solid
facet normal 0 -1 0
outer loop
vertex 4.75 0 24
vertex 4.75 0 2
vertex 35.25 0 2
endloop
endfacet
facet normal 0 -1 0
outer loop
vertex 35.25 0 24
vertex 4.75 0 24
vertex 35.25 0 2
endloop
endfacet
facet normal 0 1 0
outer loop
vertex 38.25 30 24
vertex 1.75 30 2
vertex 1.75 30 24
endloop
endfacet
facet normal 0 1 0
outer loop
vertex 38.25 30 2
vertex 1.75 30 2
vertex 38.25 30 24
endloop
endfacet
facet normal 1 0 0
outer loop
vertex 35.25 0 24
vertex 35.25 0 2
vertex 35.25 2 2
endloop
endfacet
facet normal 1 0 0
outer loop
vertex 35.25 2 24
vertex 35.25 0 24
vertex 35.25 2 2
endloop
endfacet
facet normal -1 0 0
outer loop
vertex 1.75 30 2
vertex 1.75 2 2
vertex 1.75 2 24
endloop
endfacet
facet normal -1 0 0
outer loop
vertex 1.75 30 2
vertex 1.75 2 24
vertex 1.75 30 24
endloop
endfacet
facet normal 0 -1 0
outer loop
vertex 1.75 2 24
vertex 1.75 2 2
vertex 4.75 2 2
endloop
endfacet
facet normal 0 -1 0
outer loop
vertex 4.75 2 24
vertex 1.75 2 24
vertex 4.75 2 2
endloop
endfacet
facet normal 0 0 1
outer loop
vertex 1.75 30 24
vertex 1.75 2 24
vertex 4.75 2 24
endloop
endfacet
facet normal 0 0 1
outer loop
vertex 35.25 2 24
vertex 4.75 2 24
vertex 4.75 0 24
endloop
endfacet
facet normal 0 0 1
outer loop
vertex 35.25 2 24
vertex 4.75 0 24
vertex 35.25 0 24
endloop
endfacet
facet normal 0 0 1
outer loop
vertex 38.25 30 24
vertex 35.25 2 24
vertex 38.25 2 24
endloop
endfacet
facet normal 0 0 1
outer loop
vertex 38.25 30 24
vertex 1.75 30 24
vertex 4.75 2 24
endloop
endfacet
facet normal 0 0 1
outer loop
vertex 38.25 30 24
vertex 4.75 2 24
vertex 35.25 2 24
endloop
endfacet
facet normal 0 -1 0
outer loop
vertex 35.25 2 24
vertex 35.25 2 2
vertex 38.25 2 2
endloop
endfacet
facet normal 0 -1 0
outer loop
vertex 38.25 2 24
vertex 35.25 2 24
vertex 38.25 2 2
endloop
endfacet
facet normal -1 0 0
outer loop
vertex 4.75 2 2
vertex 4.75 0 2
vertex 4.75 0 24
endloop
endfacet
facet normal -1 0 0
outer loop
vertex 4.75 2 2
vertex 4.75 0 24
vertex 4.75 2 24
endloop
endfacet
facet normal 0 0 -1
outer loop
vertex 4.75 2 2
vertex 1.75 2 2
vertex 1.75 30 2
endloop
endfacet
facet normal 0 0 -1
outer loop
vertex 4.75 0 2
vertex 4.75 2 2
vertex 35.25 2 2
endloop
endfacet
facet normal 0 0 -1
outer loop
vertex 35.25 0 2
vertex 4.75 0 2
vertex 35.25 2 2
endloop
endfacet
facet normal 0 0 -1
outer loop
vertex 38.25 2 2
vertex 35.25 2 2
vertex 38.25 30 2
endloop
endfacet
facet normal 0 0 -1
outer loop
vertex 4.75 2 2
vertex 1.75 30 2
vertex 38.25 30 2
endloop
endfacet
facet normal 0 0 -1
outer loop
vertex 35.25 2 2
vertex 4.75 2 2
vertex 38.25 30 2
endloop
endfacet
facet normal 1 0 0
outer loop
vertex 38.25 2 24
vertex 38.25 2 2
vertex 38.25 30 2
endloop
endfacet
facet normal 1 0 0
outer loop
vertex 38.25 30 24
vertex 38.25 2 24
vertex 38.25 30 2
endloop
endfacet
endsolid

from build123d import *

# Parameters (mm, degrees)
BOX001_W     = 30.5
BOX001_H     = 30
BOX001_DEPTH = 22
BOX002_W     = 36.5
BOX002_H     = 28
BOX002_DEPTH = 22


with BuildPart() as cube001:
    # Box001 → Box001 (new body)
    with BuildSketch(Plane.XY):
        with Locations((15.25, 15)):
            Rectangle(BOX001_W, BOX001_H)
    extrude(amount=BOX001_DEPTH)


with BuildPart() as switch_slot:
    # Box002 → Box002 (new body)
    with BuildSketch(Plane(origin=(-3, 2, 0), x_dir=(1, 0, 0), z_dir=(0, 0, 1))):
        with Locations((18.25, 14)):
            Rectangle(BOX002_W, BOX002_H)
    extrude(amount=BOX002_DEPTH)

    # Fusion001: union Cube001
    add(cube001.part)


with BuildPart() as switch_slot_1:
    # Fusion001 placement: moved
    add(switch_slot.part.moved(Location((4.75, 0, 2))))


solid = switch_slot_1.part
